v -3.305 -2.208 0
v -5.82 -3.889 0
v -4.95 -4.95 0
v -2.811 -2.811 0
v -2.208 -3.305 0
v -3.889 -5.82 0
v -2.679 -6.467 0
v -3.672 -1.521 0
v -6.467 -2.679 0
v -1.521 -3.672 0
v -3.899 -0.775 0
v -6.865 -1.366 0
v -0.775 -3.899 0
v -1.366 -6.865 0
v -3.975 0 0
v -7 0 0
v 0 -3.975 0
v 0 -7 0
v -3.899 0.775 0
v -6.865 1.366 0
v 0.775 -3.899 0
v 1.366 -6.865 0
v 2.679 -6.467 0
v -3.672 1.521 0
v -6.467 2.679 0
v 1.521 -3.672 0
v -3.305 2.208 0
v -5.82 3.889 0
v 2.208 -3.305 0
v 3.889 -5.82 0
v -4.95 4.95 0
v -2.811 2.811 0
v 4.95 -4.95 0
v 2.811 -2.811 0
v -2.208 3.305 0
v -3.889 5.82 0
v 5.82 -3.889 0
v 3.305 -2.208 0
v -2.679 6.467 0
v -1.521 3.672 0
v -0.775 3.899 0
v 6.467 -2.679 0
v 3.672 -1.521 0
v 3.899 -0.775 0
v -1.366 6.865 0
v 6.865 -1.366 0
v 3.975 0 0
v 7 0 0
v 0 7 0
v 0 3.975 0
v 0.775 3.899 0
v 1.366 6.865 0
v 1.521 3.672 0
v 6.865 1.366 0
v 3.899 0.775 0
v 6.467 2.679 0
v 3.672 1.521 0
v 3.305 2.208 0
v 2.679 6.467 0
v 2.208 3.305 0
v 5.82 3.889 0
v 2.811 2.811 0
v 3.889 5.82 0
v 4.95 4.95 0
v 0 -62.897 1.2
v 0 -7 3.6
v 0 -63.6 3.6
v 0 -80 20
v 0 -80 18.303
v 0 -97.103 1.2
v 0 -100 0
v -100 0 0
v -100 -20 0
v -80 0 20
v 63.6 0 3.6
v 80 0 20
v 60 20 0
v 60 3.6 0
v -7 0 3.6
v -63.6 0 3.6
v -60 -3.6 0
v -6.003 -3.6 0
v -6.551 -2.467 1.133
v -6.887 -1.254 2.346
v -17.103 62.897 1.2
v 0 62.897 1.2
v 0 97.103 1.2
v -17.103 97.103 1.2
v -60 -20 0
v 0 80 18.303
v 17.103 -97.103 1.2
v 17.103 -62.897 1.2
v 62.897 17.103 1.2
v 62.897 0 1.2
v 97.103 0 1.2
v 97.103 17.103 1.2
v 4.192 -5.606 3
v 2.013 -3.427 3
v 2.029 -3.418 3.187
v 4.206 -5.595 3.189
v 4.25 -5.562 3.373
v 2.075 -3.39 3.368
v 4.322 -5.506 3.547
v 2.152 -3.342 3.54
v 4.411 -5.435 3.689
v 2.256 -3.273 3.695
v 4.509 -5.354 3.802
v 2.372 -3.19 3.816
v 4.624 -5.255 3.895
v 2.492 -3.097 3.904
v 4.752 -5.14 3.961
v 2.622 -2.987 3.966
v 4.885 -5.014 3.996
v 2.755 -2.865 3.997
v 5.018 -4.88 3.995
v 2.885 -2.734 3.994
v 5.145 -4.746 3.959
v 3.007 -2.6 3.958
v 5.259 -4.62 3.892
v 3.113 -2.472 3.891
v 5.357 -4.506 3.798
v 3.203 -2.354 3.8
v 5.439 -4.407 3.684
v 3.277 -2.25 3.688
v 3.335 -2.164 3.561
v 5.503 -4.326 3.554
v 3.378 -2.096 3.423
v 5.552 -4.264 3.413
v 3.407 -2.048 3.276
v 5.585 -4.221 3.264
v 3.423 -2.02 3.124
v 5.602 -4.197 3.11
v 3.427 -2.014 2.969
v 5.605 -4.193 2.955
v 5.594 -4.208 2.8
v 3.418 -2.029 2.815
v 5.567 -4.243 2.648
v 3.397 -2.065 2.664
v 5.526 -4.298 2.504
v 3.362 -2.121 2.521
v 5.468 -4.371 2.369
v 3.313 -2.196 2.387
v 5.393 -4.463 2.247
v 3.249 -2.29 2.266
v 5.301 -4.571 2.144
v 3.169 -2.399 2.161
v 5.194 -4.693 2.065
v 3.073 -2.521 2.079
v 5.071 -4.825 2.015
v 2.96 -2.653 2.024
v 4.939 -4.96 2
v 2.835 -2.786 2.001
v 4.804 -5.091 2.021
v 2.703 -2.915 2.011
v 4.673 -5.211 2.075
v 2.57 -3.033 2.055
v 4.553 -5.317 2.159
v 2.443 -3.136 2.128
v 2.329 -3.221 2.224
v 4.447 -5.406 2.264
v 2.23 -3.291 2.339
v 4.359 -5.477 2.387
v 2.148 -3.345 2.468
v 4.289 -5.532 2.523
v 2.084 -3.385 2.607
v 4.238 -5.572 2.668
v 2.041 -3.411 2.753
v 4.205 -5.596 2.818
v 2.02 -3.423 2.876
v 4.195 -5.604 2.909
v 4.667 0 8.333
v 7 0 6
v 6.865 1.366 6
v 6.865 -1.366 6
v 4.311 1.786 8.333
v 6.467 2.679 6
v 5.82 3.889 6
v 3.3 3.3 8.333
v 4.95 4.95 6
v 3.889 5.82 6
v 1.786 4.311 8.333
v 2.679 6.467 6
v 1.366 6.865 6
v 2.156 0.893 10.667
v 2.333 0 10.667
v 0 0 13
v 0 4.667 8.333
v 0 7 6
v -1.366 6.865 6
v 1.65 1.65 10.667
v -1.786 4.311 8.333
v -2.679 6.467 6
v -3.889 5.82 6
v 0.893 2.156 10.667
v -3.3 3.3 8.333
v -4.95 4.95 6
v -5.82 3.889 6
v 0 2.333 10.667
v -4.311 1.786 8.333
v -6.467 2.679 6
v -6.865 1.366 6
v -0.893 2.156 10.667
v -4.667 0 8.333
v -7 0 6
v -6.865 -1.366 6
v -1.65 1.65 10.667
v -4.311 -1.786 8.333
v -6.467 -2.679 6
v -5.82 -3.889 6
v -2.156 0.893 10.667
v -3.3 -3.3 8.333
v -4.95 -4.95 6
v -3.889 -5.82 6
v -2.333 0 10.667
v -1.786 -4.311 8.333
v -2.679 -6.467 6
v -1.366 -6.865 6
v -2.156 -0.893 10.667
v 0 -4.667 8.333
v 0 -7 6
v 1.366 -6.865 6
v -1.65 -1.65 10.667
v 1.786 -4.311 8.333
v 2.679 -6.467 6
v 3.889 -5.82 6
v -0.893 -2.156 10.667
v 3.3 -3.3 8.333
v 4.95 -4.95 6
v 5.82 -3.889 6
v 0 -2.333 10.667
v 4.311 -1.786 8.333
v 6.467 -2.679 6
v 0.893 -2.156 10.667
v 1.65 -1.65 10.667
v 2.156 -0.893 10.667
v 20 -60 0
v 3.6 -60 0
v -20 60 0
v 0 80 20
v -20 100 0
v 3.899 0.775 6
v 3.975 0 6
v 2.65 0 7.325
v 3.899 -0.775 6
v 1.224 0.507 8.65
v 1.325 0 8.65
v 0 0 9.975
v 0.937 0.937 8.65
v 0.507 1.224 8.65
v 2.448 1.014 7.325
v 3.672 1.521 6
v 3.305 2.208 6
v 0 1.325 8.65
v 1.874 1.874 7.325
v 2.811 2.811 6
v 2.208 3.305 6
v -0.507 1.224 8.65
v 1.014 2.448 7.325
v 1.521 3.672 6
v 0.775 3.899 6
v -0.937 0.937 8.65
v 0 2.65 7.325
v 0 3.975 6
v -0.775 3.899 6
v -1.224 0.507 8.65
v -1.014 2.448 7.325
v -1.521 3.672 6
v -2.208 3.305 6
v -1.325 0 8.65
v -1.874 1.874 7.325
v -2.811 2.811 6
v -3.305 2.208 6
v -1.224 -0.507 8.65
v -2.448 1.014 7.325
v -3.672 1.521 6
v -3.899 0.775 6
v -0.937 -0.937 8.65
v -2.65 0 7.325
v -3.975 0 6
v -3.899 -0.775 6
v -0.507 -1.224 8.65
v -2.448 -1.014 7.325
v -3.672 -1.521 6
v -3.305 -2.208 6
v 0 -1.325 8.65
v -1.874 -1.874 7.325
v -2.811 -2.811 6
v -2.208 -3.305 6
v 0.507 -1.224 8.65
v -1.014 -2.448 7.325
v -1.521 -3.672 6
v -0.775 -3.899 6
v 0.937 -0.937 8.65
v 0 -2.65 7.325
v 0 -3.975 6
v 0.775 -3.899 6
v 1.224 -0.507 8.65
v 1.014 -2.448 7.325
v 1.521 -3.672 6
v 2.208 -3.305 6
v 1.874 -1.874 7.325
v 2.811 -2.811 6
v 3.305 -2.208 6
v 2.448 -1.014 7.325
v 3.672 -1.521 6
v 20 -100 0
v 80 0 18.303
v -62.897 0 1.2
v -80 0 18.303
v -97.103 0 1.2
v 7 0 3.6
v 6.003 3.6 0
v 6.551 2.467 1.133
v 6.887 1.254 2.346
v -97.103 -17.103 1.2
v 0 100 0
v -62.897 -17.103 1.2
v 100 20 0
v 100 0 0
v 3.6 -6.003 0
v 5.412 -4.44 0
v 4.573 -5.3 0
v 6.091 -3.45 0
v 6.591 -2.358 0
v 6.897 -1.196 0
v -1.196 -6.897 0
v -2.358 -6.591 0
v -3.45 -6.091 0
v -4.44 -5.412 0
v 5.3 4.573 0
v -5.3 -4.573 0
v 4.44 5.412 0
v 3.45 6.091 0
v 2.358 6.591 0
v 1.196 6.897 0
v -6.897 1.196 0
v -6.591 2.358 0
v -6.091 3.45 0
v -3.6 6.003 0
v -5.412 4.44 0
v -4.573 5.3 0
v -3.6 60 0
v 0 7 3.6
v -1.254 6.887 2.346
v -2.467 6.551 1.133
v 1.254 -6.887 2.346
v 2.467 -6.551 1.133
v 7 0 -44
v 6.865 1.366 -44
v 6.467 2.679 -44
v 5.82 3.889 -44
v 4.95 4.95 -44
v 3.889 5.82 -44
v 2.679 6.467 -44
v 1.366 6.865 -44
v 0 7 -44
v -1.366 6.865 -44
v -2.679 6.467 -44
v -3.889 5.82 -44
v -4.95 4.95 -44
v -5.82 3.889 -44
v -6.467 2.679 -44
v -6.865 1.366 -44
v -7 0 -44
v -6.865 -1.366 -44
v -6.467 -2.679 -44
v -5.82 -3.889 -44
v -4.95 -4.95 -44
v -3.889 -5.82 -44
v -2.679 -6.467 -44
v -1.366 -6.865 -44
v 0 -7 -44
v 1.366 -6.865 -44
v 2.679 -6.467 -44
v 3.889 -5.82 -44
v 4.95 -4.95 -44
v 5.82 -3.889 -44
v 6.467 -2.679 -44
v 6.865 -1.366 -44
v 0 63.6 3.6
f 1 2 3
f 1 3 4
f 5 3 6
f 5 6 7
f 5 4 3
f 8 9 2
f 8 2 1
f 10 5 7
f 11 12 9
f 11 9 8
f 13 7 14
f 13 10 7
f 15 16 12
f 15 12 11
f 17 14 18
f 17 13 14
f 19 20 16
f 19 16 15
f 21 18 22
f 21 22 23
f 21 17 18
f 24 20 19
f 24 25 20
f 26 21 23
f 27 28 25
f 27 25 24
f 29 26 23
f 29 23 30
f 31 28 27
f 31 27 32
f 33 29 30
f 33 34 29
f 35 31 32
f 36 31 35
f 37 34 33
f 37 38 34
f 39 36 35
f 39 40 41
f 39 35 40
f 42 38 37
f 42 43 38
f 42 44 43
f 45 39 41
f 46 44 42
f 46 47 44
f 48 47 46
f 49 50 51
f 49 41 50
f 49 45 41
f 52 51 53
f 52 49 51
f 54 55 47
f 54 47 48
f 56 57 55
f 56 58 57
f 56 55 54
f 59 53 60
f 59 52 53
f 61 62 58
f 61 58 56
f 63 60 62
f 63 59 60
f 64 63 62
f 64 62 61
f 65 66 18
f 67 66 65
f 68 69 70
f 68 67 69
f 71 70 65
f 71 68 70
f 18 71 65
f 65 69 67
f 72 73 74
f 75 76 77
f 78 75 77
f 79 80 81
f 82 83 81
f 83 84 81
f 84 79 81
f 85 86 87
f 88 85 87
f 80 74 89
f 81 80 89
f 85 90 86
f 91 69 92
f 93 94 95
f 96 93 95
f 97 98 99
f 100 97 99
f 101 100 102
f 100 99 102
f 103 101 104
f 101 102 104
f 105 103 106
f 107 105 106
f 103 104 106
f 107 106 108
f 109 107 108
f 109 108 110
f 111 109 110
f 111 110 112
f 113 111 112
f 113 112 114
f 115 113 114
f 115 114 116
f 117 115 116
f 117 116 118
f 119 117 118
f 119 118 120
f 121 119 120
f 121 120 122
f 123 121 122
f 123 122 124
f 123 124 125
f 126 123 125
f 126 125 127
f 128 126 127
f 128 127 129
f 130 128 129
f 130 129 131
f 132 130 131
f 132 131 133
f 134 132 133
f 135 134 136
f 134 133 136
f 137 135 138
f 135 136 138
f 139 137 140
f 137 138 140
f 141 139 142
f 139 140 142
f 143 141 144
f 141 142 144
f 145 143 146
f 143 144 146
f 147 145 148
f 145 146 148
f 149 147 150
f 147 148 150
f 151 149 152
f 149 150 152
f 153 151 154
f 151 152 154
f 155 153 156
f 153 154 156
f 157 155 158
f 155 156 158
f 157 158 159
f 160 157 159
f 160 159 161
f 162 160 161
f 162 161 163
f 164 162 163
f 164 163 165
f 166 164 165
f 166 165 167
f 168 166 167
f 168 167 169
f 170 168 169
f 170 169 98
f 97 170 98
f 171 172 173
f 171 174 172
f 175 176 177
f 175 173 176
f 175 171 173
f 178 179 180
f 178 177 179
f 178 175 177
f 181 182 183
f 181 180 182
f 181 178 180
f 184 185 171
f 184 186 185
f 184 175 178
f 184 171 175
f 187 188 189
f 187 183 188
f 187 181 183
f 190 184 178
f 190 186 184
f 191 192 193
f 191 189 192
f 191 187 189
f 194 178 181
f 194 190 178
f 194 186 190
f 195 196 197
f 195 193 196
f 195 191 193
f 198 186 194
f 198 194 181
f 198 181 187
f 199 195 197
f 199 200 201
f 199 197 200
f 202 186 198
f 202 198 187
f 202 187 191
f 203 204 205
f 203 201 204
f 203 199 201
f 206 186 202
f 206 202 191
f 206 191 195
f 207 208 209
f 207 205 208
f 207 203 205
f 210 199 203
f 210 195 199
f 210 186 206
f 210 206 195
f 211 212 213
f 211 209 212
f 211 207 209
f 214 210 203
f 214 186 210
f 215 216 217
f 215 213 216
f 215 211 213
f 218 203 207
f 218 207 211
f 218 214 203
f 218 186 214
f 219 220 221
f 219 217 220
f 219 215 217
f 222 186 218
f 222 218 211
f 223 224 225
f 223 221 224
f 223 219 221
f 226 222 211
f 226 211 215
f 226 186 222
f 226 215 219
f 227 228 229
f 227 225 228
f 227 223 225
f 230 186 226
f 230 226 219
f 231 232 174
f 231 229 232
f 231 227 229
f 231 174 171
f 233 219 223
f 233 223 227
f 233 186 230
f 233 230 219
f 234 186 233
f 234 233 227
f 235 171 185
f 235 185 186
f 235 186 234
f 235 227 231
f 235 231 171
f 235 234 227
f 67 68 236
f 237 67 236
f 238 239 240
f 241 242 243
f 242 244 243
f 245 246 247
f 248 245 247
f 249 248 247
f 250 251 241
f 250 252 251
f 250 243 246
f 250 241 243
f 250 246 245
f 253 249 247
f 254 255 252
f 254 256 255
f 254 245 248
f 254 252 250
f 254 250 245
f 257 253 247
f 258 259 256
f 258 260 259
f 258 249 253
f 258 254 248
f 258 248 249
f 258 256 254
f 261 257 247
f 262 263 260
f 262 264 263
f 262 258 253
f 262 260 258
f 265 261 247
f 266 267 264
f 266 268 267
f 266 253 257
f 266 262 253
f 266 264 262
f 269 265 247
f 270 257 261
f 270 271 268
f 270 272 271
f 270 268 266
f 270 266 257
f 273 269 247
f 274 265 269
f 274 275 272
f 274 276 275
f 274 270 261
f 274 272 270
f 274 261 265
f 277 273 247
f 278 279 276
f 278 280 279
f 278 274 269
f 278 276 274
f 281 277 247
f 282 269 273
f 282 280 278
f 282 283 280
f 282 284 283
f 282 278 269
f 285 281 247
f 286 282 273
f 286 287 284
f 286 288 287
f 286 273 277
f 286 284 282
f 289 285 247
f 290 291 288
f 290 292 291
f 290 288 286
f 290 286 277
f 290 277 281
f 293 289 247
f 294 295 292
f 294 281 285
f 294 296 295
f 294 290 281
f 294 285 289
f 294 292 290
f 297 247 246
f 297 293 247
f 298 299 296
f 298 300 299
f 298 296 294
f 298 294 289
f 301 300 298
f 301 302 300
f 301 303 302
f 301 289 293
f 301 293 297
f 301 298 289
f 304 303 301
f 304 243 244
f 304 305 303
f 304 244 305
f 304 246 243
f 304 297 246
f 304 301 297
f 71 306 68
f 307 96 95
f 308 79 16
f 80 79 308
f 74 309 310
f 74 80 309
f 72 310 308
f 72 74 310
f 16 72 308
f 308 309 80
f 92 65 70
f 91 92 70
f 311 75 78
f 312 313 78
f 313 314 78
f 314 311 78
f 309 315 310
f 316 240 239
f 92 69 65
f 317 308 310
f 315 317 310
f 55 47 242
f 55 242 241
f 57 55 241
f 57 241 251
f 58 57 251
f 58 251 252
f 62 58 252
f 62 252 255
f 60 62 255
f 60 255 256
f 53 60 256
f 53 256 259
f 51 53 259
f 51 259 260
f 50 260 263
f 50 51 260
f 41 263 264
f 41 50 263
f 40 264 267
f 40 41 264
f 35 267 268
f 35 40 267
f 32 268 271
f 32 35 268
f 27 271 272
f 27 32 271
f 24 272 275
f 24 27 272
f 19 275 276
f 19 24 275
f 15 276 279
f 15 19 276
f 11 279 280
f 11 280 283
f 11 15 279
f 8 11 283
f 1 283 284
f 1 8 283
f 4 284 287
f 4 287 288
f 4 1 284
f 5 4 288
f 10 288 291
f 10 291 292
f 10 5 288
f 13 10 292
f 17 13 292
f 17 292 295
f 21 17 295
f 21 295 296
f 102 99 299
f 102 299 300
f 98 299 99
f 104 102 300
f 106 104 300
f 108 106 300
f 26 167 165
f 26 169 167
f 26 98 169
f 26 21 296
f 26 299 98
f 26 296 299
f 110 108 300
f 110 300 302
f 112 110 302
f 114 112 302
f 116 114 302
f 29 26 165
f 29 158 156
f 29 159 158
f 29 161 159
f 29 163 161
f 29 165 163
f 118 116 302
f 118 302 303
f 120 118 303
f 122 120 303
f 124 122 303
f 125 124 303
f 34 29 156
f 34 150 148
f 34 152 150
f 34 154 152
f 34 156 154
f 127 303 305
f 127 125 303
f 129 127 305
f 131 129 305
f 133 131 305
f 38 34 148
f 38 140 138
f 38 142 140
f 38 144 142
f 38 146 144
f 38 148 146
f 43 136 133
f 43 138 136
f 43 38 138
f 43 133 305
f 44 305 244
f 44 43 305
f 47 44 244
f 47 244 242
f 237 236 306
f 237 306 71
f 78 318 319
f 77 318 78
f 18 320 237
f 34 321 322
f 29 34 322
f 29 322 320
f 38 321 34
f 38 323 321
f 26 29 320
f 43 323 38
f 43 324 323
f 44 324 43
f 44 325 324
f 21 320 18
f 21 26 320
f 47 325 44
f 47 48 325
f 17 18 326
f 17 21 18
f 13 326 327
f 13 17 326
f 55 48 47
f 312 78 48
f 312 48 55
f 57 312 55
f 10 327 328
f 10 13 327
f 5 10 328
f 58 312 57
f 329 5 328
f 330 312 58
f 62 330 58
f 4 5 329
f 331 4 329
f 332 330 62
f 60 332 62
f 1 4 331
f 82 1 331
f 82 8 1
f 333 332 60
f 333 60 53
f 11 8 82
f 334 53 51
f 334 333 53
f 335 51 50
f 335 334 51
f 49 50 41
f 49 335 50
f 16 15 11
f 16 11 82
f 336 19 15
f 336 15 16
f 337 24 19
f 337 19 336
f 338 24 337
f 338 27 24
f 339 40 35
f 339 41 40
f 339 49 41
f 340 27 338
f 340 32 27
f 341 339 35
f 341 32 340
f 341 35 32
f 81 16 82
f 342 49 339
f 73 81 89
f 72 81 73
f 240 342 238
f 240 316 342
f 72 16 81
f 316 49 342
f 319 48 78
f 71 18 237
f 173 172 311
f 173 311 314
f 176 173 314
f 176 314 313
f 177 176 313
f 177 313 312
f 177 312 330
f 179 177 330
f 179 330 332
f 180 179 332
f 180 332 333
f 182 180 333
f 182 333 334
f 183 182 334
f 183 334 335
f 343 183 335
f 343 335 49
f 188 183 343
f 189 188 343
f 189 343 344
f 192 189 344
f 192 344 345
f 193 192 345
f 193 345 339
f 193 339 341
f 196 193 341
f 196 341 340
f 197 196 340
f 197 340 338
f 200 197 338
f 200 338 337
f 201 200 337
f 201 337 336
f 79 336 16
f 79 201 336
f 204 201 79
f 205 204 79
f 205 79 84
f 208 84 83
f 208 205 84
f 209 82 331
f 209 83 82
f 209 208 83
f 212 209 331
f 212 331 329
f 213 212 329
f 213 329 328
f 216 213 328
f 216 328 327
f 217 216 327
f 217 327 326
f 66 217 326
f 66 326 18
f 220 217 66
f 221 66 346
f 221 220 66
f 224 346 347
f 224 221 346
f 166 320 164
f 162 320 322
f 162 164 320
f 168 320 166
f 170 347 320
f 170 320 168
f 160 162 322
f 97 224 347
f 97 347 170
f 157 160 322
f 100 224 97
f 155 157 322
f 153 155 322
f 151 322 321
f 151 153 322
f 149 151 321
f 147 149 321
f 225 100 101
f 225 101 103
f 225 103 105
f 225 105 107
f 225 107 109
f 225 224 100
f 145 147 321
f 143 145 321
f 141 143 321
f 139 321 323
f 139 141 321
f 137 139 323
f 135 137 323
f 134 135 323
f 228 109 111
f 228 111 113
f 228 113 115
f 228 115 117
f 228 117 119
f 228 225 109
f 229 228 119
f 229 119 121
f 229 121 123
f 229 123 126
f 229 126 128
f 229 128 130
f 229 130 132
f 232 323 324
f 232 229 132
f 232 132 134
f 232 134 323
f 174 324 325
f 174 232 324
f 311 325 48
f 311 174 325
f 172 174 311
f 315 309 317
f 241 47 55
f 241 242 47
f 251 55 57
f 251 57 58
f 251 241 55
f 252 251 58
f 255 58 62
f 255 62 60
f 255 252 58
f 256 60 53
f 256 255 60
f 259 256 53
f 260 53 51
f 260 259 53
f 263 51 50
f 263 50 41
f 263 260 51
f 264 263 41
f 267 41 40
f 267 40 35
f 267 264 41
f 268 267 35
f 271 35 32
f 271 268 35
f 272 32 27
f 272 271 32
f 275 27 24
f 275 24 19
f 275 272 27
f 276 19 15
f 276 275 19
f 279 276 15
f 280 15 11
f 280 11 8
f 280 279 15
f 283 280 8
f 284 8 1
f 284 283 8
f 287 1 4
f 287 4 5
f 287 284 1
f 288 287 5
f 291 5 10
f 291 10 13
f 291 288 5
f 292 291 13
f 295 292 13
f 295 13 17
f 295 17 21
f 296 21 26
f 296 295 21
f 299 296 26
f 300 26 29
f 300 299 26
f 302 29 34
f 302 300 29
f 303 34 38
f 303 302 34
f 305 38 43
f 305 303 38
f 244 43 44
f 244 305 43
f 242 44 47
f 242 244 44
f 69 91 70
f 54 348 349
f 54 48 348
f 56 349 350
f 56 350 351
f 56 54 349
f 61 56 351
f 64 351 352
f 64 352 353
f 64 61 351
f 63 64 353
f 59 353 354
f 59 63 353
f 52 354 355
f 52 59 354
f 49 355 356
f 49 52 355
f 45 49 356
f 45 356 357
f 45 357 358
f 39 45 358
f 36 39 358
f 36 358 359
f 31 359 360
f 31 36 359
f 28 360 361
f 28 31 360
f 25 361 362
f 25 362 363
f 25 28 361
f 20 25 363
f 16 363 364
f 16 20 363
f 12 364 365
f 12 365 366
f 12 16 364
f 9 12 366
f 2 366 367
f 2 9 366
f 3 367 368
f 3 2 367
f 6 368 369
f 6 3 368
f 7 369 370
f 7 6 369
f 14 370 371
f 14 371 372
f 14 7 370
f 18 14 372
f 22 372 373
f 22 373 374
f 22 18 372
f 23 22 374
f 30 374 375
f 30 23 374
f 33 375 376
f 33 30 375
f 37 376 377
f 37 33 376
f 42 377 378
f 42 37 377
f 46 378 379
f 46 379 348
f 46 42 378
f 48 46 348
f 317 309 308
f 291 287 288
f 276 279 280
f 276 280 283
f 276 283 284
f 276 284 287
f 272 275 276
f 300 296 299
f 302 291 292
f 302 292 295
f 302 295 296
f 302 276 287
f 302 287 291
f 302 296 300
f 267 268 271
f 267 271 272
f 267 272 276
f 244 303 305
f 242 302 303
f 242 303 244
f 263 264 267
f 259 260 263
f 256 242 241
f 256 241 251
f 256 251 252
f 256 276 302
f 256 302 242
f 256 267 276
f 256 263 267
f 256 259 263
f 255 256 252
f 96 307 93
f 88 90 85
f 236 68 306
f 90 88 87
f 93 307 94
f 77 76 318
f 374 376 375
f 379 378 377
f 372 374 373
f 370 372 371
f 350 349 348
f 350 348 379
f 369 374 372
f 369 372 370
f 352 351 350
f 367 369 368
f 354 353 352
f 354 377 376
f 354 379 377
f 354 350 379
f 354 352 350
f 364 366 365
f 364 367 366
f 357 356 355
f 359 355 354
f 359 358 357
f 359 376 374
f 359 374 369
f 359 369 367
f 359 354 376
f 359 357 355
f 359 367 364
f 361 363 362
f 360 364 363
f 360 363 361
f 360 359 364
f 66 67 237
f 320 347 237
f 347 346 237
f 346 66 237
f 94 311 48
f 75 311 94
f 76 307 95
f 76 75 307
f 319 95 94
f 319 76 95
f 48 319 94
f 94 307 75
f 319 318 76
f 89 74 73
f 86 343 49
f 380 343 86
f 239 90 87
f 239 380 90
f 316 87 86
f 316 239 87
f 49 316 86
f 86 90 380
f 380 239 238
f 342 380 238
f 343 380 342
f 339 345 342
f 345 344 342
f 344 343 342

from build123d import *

# Parameters (mm, degrees)
F1_DEPTH    = 20
F2_T1_DEPTH = 122.8673195186
F2_T3_DEPTH = 142.8673195186
F3_T        = -1.2
F0_W        = 53
F0_H        = 3.6
F0_W_2      = 3.025
F4_DEPTH    = 5
F0_H_2      = 2.4
F6_T4_DEPTH = 84.4178503941
F6_S5_R     = 7
F6_T6_DEPTH = 44
F7_COUNT    = 4
F9_R        = 1
F10_DEPTH   = 141.4223562373


# Not quite as in the source:
# - a fillet or chamfer that OpenCascade refuses, or shapes differently, is made with other operations: its cross-section is extruded or revolved along the edge and cut away or added


with BuildPart() as f1:
    # F0 (on Front) → F1 (new body)
    with BuildSketch(Plane.XZ):
        Polygon((63.6, 3.6), (60, 0), (100, 0), (100, 20), (60, 20), (60, 3.6), align=None)
        Polygon((60, 3.6), (60, 0), (63.6, 3.6), align=None)
    extrude(amount=-F1_DEPTH)

    # F2: chamfer of 20 on 3 edges, made by hand

    # F2_s2 → F2_t1 (cut)
    with BuildSketch(Plane.XZ.offset(-71.4336597593)):
        Polygon((80, 20), (60, 0), (60, 20), align=None)
        Polygon((100, 0), (80, 20), (100, 20), align=None)
    extrude(amount=F2_T1_DEPTH, mode=Mode.SUBTRACT)

    # F2_s4 → F2_t3 (cut)
    with BuildSketch(Plane.YZ.offset(8.5663402407)):
        Polygon((0, 20), (20, 0), (20, 20), align=None)
    extrude(amount=F2_T3_DEPTH, mode=Mode.SUBTRACT)

    # F3
    f3_openings = [f1.faces().sort_by_distance(p)[0] for p in [
        (80, 0, 6.666667),
    ]]
    offset(amount=F3_T, openings=f3_openings)

    # F0 (on Front) → F4 (join)
    with BuildSketch(Plane.XZ):
        with Locations((33.5, 1.8)):
            Rectangle(F0_W, F0_H)
        Polygon((60, 3.6), (60, 0), (63.6, 3.6), align=None)
        with Locations((5.4875, 1.8)):
            Rectangle(F0_W_2, F0_H)
    extrude(amount=-F4_DEPTH)

    # F0 (on Front) → F5 (revolve)
    with BuildSketch(Plane.XZ):
        with Locations((5.4875, 4.8)):
            Rectangle(F0_W_2, F0_H_2)
        with Locations((5.4875, 1.8)):
            Rectangle(F0_W_2, F0_H)
        Polygon((0, 9.975), (3.975, 6), (7, 6), (0, 13), align=None)
    revolve(axis=Axis((0, 0, 3), (0, 0, 1)))

    # F6: chamfer of 5 on 1 edges, made by hand


with BuildPart() as f6_tool2:
    # F6_s3 → F6_t4 (new body)
    with BuildSketch(Plane.YZ.offset(76.4584149398)):
        Polygon((0, 3.6), (5, -1.4), (5, 3.6), align=None)
    extrude(amount=-F6_T4_DEPTH)

    # F6_s5 → F6_t6 (cut, symmetric)
    with BuildSketch(Plane.XY.offset(1.1)):
        Circle(F6_S5_R)
    extrude(amount=F6_T6_DEPTH, both=True, mode=Mode.SUBTRACT)

    split(bisect_by=Plane(origin=(30, 0, -30), x_dir=(0, 1, 0), z_dir=(-0.7071067812, 0, 0.7071067812)), keep=Keep.TOP)


with BuildPart() as f1_1:
    add(f1.part)

    # F6_t1: cut F6_tool2
    add(f6_tool2.part, mode=Mode.SUBTRACT)

    # F7: F1 ×4 about axis
    f7_axis = Axis((0, 0, 3), (0, 0, 1))


with BuildPart() as f1_2:
    add(f1_1.part)
    for i in range(1, F7_COUNT):
        add(f1_1.part.rotate(f7_axis, i * 360 / F7_COUNT))

    # F9 (on line) → F10 (cut, through all)
    with BuildSketch(Plane(origin=(0, 0, 0), x_dir=(-0.7071067812, -0.7071067812, 0), z_dir=(-0.7071067812, 0.7071067812, 0))):
        with Locations((0, 3)):
            Circle(F9_R)
    extrude(amount=-F10_DEPTH, mode=Mode.SUBTRACT)


with BuildPart() as f12:
    # F11 (on Front) → F12 (revolve)
    with BuildSketch(Plane.XZ):
        Polygon((3.975, 6), (0, 6), (0, -44), (7, -44), (7, 0), (3.975, 0), align=None)
    revolve(axis=Axis((0, 0, -19), (0, 0, 1)))


solid = Compound([f1_2.part, f12.part])
